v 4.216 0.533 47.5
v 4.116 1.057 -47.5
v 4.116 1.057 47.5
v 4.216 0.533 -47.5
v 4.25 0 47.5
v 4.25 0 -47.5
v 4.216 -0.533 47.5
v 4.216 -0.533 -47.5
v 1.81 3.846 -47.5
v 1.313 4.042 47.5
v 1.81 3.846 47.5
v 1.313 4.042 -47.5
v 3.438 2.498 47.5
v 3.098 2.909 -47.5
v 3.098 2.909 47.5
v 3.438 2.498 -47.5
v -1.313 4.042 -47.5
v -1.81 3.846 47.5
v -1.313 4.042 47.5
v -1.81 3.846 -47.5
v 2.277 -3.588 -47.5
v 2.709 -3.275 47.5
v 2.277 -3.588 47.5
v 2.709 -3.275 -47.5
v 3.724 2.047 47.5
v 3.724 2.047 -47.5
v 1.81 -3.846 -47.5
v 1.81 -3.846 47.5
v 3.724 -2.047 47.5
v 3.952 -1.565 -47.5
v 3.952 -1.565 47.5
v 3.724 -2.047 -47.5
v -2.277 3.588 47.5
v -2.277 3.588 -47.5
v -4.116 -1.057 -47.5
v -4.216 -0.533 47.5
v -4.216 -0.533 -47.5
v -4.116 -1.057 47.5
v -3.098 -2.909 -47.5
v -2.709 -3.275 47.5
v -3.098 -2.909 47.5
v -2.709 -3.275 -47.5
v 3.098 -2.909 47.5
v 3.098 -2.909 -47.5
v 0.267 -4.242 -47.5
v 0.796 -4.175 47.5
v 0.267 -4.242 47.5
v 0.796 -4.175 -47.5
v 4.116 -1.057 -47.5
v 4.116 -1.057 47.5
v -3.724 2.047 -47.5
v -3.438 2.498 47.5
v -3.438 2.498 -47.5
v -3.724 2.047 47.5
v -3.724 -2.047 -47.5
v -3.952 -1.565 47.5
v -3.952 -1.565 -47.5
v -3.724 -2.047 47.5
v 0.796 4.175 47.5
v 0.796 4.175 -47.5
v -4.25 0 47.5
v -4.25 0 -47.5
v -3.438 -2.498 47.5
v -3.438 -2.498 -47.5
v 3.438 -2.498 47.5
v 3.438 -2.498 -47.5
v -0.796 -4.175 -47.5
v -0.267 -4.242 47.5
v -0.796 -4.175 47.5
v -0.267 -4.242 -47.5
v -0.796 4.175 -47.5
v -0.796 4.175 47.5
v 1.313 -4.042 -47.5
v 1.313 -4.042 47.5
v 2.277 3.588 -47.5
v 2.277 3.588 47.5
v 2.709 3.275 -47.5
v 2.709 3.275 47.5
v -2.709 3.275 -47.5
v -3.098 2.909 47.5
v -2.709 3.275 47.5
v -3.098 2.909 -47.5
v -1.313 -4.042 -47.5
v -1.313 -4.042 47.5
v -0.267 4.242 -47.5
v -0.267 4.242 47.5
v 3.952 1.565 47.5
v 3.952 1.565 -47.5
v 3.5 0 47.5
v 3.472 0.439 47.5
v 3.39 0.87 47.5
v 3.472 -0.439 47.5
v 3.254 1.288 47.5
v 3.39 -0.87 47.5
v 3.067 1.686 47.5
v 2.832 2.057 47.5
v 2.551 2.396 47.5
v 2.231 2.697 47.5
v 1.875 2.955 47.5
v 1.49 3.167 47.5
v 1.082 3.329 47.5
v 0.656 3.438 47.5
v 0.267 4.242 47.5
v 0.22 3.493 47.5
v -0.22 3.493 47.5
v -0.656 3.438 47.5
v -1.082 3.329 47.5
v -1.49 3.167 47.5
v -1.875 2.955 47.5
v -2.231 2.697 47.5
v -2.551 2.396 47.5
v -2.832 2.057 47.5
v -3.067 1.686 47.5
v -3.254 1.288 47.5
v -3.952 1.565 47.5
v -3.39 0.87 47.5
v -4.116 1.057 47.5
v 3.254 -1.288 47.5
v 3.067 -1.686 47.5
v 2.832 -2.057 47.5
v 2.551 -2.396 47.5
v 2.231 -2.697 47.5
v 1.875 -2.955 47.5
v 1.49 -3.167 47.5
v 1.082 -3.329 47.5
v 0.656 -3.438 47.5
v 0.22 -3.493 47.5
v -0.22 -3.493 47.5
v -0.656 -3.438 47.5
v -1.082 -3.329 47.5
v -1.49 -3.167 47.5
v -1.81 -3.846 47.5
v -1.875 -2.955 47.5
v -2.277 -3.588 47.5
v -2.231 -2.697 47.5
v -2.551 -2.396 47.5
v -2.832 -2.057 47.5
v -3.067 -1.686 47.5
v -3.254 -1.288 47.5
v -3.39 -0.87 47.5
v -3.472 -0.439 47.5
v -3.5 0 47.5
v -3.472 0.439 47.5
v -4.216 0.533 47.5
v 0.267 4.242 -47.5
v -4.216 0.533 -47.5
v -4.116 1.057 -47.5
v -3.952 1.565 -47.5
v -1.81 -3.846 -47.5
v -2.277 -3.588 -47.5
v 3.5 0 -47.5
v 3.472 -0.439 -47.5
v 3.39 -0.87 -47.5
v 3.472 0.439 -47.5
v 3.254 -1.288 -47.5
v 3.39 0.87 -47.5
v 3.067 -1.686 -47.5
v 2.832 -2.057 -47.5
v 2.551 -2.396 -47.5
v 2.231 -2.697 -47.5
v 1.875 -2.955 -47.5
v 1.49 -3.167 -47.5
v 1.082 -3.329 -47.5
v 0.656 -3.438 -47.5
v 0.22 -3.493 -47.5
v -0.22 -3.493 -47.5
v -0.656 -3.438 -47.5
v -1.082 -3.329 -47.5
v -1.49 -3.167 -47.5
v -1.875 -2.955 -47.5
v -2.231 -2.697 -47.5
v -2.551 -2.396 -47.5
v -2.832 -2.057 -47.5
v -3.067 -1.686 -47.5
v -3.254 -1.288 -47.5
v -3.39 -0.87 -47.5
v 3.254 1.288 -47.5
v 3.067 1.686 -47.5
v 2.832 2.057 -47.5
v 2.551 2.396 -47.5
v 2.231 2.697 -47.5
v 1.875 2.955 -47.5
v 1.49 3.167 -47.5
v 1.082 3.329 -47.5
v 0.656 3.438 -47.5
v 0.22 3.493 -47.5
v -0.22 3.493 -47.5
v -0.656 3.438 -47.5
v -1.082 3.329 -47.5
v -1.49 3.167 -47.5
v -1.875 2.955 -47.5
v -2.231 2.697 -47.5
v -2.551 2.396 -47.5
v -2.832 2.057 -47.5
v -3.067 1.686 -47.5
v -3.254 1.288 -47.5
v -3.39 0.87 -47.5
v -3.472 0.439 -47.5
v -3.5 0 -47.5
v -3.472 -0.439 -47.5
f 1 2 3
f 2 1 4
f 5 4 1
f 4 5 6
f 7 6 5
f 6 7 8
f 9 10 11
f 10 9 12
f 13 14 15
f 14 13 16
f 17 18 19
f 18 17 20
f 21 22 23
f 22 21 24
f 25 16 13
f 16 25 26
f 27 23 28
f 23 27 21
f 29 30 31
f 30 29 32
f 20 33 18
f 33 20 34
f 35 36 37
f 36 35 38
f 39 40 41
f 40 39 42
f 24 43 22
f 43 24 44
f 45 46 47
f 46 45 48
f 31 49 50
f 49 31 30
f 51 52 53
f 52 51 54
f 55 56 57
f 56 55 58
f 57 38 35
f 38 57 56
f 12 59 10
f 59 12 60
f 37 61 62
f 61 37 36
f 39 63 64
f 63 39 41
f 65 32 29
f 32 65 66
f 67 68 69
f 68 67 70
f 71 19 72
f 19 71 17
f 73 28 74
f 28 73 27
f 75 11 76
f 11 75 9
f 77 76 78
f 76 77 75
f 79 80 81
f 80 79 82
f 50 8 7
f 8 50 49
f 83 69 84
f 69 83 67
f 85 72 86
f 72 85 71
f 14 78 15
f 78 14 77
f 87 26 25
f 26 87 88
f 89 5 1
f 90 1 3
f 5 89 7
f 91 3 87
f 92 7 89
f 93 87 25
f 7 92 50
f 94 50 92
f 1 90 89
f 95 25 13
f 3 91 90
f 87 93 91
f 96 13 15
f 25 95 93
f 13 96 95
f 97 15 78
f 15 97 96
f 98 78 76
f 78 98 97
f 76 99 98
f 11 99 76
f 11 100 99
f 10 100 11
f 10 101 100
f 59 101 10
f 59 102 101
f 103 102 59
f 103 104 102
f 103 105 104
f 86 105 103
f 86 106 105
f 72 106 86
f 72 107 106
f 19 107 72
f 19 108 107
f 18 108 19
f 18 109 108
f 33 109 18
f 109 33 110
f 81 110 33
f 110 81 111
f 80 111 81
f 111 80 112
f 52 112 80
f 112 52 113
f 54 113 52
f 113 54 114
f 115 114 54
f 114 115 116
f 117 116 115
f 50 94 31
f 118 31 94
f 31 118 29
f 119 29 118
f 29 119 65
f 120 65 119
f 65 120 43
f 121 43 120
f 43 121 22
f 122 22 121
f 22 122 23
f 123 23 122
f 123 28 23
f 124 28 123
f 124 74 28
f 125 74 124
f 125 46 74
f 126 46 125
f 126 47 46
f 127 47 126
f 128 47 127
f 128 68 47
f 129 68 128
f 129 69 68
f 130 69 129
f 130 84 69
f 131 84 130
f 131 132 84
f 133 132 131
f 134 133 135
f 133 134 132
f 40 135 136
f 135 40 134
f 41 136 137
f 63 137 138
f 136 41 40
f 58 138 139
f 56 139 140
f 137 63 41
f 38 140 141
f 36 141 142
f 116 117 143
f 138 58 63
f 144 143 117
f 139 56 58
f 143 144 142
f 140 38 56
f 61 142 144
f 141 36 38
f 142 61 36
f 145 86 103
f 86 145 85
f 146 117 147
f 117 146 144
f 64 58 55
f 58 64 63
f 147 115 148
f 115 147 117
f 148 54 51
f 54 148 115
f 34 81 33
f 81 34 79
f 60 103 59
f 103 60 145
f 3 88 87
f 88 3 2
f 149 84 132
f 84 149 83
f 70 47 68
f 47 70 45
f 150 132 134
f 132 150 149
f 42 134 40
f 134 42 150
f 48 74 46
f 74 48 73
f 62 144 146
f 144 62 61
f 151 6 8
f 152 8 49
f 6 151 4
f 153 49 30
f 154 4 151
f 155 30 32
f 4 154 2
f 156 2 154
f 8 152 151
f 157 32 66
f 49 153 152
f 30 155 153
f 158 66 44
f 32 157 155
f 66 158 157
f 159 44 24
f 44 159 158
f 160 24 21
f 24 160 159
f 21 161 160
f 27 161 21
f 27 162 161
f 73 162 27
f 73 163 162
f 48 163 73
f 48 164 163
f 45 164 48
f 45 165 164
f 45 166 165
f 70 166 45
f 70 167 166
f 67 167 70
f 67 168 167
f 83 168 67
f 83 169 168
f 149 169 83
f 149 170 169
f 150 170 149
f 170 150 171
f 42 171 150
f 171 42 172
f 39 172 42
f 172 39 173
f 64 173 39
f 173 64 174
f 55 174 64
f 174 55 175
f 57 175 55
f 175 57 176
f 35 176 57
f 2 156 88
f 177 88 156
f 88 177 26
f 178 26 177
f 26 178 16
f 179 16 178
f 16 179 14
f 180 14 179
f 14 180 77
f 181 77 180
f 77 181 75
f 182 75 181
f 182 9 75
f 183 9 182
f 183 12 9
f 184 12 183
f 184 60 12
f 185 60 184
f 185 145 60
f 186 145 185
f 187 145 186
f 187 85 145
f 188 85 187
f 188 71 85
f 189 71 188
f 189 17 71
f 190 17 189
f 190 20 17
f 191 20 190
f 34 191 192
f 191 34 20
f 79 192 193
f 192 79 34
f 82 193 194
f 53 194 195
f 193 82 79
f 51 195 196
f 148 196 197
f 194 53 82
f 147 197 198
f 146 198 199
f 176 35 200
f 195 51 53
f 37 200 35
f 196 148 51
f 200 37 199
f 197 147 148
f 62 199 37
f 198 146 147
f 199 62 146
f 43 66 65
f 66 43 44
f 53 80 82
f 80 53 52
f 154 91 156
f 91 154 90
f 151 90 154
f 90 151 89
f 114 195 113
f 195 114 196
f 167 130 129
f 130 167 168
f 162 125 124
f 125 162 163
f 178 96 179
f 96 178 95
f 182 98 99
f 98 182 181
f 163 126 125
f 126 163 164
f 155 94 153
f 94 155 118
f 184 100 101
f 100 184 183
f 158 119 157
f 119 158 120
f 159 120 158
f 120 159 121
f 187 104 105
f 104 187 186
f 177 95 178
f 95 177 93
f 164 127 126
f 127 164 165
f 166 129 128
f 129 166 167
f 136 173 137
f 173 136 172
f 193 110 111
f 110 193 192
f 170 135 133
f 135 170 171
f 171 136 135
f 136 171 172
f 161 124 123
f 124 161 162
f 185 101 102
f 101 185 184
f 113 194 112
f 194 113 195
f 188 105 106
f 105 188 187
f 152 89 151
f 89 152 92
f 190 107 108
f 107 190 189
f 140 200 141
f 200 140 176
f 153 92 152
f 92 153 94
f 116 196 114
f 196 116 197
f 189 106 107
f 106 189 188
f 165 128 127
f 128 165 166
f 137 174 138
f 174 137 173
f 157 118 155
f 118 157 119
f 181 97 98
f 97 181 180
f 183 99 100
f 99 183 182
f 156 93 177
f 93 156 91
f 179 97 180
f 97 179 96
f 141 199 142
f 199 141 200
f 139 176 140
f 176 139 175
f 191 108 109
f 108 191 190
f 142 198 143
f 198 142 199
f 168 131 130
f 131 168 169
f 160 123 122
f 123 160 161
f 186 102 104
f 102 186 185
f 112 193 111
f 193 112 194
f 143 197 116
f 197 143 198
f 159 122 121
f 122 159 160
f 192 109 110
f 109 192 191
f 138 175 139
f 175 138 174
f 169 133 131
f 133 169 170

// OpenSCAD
$fn = 50;


difference() {
	union() {
		translate(v = [0, 0, -47.5000000000]) {
			cylinder(h = 95, r = 4.2500000000);
		}
	}
	union() {
		translate(v = [0, 0, -100.0000000000]) {
			cylinder(h = 200, r = 3.5000000000);
		}
	}
}
